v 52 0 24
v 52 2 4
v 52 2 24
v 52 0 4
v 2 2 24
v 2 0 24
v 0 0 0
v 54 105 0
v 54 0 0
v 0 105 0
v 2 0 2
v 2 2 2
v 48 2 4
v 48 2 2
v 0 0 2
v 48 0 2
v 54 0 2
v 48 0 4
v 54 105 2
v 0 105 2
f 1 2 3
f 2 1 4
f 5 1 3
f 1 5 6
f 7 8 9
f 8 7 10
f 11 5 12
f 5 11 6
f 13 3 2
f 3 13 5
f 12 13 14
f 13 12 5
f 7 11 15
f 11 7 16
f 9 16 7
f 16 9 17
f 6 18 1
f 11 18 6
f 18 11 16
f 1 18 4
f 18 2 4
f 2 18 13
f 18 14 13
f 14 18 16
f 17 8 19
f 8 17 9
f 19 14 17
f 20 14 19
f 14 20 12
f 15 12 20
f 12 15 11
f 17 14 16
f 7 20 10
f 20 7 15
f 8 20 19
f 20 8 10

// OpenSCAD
//Lightbox Measurements
L=110; //Length of Lightbox
W=60; //Width of Lightbox
FaceH=24; //Height of FacePlate
//Constants
Wall=5; //Wall and bottom Thickness
SlotH=2; //Slot height for the slide in insert
SlotW=2; //Width of the tab for the slot
FaceT=2; //Thickness of faceplate
CableH=3; //Height of cable slot
CableW=5; //Width of cable slot
TwoWall = Wall*2; //Two walls combined width
InsertW=W-((Wall-SlotW)*2); //Total Width of the insert

cube([InsertW,L-Wall,SlotH]); //slot plate
difference() //FacePlate with cut out for cable passthrough
{
	//FacePlate: Width=Interior of Lightbox = Exterior width - Walls shifted by slotwidth
	translate([SlotW,0,0]) cube([W-TwoWall,FaceT,FaceH]);
	//Cable slot cut out, using Wall as cutout thickness since Cutout > thickness
	translate([W-TwoWall-SlotW,-1,1]) cube([CableW,Wall,CableH]);
}
